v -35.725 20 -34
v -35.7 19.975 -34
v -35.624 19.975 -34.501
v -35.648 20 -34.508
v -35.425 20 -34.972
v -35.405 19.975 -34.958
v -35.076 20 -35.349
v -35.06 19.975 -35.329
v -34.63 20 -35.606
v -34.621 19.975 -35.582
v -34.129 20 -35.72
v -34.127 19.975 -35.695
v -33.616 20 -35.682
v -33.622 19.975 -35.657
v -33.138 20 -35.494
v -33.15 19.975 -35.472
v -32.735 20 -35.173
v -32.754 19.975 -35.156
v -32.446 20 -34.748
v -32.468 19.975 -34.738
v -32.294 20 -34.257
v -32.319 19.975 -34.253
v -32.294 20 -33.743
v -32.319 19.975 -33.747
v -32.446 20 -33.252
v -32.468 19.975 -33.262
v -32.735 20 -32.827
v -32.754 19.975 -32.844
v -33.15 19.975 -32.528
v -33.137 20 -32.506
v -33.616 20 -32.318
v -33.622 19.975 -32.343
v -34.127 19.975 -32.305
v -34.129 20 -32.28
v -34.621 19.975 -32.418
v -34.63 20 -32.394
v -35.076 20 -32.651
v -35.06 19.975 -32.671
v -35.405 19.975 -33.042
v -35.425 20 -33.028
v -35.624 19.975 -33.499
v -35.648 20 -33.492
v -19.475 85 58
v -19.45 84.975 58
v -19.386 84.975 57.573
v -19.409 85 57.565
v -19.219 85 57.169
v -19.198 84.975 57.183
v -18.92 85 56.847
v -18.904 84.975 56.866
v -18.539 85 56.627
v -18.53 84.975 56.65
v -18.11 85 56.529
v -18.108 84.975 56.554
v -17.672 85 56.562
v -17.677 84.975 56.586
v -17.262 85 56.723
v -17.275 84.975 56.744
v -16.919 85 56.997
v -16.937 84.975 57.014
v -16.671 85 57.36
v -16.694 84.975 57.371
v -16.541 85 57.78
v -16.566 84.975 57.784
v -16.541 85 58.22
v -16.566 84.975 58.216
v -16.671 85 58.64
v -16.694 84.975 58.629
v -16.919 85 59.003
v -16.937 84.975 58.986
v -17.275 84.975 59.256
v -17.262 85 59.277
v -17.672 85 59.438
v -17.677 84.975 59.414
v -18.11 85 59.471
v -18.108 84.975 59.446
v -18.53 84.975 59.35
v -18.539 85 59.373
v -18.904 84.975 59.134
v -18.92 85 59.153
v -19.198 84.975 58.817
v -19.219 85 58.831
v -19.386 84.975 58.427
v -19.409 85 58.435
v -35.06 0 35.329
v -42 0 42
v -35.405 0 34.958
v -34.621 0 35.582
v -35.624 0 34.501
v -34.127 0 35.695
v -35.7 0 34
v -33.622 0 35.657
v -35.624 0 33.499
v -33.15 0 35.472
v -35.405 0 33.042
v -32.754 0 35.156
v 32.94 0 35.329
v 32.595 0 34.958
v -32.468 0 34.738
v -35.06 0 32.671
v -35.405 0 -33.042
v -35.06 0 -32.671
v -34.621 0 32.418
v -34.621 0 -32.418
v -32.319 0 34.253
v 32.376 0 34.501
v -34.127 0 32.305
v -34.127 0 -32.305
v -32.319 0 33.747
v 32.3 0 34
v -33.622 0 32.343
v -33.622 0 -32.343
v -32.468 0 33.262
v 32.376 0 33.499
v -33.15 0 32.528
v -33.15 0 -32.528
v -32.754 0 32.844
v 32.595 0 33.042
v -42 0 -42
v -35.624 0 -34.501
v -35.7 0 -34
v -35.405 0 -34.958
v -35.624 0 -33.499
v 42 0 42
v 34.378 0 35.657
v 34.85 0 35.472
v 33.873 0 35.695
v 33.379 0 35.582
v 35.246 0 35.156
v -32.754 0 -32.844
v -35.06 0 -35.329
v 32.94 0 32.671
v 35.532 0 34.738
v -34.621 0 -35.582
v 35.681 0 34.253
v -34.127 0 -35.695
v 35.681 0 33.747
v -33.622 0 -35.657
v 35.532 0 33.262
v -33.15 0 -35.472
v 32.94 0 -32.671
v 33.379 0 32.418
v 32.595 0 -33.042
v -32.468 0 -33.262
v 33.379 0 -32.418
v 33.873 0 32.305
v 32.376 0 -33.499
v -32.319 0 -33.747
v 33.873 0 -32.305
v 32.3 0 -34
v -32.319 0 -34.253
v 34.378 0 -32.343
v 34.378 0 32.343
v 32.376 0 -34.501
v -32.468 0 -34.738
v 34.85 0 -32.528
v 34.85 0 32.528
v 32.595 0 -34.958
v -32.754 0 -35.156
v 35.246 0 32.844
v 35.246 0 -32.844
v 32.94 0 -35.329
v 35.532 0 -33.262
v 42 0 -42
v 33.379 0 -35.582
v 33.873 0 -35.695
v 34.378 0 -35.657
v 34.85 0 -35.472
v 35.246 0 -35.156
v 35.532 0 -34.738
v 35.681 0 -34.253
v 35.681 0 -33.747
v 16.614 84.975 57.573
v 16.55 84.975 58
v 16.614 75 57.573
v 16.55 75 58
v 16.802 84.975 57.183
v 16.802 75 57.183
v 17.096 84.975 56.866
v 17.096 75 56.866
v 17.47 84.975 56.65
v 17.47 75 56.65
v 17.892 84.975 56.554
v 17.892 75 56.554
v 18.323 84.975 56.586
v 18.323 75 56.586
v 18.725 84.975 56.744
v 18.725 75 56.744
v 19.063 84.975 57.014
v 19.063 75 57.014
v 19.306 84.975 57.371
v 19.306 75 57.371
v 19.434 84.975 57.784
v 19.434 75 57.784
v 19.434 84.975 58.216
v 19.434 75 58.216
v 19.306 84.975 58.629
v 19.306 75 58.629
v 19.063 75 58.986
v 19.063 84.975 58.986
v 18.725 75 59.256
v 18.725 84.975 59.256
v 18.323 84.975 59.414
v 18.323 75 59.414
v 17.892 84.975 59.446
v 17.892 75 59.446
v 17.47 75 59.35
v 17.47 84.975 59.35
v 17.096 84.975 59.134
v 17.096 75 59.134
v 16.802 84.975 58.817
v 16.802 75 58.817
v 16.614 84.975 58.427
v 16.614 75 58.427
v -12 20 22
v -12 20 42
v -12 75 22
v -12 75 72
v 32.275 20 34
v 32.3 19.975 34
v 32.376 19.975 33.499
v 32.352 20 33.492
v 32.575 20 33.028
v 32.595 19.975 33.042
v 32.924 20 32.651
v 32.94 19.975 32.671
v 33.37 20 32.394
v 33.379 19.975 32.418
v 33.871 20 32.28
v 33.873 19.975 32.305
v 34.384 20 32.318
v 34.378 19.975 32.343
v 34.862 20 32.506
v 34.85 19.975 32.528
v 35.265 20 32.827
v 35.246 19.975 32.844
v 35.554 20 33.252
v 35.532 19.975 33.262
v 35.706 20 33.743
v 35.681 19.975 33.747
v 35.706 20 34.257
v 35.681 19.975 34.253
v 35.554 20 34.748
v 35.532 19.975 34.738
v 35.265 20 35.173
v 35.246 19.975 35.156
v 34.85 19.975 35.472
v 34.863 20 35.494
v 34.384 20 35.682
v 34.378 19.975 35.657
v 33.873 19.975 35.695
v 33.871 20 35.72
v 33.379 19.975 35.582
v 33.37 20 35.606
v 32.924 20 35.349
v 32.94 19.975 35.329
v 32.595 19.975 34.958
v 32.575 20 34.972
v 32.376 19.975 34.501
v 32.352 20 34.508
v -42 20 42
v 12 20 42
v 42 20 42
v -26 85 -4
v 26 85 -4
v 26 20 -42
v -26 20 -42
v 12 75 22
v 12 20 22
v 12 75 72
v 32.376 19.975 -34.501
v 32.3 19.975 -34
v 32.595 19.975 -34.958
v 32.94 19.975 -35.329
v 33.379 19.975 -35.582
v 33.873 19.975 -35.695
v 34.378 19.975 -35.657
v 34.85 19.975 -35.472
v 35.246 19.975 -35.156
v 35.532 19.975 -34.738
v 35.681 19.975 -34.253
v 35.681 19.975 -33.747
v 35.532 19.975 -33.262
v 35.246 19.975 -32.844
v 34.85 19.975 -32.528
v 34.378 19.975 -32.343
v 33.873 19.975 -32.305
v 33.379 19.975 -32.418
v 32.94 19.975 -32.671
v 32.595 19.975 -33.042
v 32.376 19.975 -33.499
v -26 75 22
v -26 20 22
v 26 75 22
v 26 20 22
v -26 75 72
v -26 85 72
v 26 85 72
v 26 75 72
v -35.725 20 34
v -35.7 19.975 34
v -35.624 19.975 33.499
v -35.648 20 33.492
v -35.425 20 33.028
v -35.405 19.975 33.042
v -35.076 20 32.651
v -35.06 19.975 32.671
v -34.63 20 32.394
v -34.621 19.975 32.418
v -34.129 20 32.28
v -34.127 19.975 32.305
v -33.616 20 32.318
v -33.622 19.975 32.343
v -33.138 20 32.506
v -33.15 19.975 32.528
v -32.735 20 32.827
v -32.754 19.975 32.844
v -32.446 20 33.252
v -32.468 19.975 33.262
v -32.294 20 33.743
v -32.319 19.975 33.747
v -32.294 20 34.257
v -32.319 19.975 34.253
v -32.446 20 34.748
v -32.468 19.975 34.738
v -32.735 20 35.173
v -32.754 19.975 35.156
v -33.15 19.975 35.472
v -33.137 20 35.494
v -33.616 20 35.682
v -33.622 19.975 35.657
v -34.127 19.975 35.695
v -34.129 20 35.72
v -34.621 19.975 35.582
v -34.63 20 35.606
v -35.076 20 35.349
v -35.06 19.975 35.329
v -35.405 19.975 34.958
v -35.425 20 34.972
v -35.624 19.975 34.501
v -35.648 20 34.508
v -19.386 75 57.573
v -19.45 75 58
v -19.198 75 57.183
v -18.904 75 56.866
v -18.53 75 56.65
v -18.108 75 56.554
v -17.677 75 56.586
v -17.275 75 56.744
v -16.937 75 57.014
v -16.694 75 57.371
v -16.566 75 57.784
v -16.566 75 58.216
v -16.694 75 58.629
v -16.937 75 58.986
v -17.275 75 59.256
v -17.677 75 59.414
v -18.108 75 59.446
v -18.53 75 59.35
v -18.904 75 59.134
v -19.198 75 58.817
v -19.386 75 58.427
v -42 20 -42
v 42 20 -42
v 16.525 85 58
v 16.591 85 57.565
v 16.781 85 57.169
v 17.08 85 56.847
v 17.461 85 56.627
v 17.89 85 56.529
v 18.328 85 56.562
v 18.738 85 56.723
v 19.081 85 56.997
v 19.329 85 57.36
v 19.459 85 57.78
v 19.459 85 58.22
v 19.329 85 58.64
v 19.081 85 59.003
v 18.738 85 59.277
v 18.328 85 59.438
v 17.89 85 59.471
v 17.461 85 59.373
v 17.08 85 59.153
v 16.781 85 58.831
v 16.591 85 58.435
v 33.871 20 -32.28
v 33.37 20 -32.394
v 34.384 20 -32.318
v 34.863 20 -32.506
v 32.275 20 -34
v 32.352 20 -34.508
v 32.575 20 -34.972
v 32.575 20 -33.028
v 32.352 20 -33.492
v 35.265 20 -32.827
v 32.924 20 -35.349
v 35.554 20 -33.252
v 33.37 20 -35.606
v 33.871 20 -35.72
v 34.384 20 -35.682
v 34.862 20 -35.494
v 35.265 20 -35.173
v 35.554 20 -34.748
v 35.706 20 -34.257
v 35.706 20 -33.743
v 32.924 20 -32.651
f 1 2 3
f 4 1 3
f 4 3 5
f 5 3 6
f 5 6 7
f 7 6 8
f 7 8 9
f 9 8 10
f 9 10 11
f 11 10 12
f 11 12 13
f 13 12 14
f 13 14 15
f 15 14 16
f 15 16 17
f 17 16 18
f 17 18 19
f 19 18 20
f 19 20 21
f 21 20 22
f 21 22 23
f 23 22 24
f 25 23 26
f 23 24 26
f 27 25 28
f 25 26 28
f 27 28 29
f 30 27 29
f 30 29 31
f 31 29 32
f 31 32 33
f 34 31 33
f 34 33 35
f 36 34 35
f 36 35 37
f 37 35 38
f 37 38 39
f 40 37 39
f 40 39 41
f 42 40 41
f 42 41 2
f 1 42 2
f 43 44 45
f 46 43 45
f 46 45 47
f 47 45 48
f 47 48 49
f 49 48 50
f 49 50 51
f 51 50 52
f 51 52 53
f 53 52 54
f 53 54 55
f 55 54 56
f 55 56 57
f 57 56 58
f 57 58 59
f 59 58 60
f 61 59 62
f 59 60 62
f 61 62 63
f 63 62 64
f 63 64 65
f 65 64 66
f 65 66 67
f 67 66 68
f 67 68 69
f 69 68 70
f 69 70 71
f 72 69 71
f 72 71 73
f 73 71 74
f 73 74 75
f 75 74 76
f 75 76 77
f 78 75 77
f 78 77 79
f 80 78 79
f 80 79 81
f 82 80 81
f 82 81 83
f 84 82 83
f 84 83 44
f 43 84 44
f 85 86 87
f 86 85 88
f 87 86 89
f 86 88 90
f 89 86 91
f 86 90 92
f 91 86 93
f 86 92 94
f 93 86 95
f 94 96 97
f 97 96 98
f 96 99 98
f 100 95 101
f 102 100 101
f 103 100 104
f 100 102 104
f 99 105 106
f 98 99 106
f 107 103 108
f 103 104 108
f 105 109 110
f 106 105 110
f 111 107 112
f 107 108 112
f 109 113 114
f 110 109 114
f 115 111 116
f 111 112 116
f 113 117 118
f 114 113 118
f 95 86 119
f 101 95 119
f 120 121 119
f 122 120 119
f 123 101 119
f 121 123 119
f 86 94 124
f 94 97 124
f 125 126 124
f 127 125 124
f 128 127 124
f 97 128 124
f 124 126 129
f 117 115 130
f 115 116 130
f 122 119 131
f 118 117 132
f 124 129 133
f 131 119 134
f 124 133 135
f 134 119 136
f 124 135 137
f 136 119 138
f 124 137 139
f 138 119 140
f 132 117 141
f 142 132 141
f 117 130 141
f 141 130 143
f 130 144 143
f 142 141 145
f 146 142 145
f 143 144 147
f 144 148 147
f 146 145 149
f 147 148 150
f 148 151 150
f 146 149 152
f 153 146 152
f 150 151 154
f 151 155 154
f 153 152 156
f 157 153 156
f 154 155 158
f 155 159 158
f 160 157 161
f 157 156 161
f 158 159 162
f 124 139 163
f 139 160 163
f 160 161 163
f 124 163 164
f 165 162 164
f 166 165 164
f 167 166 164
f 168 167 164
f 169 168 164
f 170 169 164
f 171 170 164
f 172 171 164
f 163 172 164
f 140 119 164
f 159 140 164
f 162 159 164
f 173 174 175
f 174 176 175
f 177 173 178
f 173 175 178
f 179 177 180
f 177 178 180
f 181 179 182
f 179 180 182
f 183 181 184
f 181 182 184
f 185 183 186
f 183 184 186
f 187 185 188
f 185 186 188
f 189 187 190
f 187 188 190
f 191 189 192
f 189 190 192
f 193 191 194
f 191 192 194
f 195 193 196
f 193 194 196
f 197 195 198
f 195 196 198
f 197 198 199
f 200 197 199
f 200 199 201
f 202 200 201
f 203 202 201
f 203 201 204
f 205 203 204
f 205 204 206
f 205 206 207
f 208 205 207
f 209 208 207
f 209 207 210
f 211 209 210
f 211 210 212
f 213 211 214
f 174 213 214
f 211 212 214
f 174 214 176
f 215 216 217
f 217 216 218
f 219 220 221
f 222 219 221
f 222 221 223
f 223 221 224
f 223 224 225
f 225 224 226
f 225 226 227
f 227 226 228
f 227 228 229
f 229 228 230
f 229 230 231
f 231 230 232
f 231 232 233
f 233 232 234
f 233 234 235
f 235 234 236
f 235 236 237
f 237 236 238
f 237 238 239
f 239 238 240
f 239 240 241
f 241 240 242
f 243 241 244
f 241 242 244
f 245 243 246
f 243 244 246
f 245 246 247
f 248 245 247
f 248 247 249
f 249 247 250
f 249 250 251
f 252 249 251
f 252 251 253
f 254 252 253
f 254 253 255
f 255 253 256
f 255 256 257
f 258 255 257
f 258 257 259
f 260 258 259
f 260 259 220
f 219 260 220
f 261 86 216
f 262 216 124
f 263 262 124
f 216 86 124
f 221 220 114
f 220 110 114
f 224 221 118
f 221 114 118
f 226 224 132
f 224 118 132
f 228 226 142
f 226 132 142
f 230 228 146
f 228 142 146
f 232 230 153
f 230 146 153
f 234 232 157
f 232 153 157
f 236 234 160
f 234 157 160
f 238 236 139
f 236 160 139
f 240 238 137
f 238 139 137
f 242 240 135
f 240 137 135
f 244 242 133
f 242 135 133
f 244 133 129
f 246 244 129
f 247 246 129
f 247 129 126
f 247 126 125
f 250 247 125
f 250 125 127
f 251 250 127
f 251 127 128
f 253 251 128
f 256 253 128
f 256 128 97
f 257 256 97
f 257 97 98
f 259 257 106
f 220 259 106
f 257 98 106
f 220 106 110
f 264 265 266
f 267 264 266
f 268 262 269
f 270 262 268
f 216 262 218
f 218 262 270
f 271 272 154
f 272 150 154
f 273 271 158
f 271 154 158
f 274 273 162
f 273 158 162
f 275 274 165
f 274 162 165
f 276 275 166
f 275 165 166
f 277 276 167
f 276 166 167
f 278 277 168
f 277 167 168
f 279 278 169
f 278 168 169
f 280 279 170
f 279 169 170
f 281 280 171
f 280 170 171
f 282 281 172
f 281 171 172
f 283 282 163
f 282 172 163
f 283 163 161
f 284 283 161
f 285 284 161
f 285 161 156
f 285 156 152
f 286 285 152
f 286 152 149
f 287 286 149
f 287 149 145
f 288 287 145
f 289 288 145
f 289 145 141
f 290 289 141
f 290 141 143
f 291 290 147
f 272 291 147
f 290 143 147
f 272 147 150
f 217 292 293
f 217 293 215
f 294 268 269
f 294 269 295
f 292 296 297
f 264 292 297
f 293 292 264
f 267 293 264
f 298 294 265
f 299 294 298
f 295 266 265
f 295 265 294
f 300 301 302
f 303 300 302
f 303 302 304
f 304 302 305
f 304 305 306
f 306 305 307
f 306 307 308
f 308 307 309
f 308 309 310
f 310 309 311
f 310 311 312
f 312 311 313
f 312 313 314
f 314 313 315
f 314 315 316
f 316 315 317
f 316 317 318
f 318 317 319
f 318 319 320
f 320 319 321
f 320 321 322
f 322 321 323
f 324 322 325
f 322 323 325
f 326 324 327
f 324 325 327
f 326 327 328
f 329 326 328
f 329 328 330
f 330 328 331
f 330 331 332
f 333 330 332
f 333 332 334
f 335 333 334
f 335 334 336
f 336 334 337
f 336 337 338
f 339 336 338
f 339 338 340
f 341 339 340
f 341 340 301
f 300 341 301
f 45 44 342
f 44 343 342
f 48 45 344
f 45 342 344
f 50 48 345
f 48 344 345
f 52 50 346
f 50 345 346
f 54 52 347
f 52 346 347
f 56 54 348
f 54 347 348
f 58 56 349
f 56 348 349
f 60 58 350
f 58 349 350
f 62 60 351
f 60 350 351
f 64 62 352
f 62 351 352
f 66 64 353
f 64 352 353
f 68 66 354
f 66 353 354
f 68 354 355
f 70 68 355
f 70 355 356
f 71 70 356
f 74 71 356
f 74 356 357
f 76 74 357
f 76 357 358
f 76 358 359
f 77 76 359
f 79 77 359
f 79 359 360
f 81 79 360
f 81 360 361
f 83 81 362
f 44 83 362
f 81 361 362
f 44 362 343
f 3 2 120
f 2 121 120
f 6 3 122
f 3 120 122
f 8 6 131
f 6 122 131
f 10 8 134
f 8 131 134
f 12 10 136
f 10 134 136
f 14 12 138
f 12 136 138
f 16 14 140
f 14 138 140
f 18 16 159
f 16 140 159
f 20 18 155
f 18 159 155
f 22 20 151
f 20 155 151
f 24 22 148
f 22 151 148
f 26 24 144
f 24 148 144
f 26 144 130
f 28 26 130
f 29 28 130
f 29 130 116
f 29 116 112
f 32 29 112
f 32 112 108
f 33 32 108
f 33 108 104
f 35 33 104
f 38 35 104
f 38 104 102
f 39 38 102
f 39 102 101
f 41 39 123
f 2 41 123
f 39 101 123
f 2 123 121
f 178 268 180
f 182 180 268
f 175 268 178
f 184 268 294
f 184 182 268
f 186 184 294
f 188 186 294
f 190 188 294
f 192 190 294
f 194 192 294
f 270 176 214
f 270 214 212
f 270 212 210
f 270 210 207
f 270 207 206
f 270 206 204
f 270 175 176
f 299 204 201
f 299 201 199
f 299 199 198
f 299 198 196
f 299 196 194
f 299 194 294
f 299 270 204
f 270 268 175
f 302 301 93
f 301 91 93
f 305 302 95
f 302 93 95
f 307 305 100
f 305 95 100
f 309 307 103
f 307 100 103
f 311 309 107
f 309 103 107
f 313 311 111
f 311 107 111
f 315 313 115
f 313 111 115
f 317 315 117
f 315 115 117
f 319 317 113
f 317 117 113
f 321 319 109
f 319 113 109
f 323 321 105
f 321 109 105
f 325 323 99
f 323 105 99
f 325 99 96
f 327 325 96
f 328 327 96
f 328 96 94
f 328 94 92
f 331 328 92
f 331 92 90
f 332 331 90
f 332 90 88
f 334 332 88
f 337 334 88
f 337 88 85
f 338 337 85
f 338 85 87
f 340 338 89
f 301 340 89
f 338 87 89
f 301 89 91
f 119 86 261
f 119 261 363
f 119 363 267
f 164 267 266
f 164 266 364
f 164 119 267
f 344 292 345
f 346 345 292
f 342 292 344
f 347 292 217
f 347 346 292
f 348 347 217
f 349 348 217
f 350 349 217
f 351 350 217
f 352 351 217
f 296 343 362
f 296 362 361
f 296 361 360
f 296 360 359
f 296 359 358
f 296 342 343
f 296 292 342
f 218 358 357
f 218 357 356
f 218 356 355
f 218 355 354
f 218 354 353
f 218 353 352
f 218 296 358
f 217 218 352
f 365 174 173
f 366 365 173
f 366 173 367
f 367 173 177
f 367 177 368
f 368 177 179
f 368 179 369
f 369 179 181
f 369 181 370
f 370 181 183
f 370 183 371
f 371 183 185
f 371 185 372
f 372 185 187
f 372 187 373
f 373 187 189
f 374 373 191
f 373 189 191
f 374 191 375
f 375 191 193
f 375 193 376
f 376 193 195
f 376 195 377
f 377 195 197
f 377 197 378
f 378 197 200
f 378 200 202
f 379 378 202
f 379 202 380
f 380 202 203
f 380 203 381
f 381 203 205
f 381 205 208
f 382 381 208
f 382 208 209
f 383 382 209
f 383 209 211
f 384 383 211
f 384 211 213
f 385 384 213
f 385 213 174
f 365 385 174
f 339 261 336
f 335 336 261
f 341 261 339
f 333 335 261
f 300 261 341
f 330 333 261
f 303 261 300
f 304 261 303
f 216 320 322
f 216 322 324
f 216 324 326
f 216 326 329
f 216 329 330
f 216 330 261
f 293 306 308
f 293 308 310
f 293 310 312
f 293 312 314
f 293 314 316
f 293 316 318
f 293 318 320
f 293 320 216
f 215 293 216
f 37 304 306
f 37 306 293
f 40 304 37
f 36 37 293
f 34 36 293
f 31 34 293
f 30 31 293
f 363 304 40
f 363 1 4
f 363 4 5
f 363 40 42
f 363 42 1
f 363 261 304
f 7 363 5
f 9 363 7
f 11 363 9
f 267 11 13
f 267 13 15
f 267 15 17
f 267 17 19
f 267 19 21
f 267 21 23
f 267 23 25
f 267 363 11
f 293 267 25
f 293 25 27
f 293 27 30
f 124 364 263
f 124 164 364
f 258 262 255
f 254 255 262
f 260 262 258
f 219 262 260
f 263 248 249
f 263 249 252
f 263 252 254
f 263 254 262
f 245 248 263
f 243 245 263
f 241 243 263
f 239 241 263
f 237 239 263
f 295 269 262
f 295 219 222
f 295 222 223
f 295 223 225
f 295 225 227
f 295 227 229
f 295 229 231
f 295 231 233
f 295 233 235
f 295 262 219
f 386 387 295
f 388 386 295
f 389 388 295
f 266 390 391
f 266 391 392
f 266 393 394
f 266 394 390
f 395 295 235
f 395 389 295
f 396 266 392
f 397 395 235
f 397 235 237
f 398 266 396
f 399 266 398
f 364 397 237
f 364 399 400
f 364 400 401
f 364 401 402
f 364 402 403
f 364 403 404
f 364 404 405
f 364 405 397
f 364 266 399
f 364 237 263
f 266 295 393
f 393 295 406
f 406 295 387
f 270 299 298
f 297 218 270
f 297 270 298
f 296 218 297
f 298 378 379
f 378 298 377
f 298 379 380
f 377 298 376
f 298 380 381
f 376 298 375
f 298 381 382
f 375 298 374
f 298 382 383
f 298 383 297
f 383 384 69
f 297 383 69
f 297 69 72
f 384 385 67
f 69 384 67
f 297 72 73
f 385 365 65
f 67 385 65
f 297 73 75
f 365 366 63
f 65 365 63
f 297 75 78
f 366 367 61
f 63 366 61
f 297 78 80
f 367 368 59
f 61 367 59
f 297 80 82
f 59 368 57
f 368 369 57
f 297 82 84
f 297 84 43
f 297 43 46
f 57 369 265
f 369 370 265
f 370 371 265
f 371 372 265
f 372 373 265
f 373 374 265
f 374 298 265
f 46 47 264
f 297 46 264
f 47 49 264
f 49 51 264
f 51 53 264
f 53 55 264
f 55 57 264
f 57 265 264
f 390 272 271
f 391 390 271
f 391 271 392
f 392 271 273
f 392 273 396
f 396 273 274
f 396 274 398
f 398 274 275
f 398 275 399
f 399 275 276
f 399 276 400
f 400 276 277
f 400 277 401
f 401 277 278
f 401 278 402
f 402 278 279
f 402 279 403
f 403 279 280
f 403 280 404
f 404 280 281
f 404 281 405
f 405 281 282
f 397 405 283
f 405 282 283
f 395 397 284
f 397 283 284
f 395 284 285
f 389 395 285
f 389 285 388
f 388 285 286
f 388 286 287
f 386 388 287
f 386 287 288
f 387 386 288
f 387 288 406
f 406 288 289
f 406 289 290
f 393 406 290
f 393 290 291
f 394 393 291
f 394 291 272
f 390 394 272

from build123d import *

# Parameters (mm, degrees)
SKETCH1_W                        = 84
SKETCH1_H                        = 84
BOSS_EXTRUDE1_DEPTH              = 20
M3_CLEARANCE_HOLE1_D             = 3.4
M3_CLEARANCE_HOLE1_CSINK_D       = 3.45
M3_CLEARANCE_HOLE1_CSINK_ANGLE   = 90
BOSS_EXTRUDE2_DEPTH              = 65
BOSS_EXTRUDE3_DEPTH              = 10
M2_5_CLEARANCE_HOLE2_D           = 2.9
M2_5_CLEARANCE_HOLE2_DEPTH       = 10
M2_5_CLEARANCE_HOLE2_CSINK_D     = 2.95
M2_5_CLEARANCE_HOLE2_CSINK_ANGLE = 90
M2_5_CLEARANCE_HOLE2_TIP         = 0.871247898
SKETCH16_W                       = 30
SKETCH16_H                       = 55
CUT_EXTRUDE2_DEPTH               = 50
CUT_EXTRUDE3_DEPTH               = 124.794184031
CUT_EXTRUDE4_DEPTH               = 230
SKETCH19_W                       = 16
SKETCH19_H                       = 65
CUT_EXTRUDE5_DEPTH               = 230


with BuildPart() as part:
    # Sketch1 → Boss-Extrude1 (new body)
    with BuildSketch(Plane(origin=(0, 0, 0), x_dir=(1, 0, 0), z_dir=(0, 1, 0))):
        Rectangle(SKETCH1_W, SKETCH1_H)
    extrude(amount=BOSS_EXTRUDE1_DEPTH)

    # M3 Clearance Hole1 (through all)
    with Locations(Plane(origin=(0, 20, 0), x_dir=(1, 0, 0), z_dir=(0, 1, 0))):
        with Locations((-34, 34), (34, 34), (34, -34), (-34, -34)):
            CounterSinkHole(M3_CLEARANCE_HOLE1_D / 2, M3_CLEARANCE_HOLE1_CSINK_D / 2, counter_sink_angle=M3_CLEARANCE_HOLE1_CSINK_ANGLE)

    # Sketch5 → Boss-Extrude2 (add)
    with BuildSketch(Plane(origin=(0, 20, 0), x_dir=(1, 0, 0), z_dir=(0, 1, 0))):
        Polygon((-42, 4), (-26, 4), (-26, 42), (26, 42), (26, 4), (42, 4), (42, -72), (-42, -72), align=None)
    extrude(amount=BOSS_EXTRUDE2_DEPTH)

    # Sketch7 → Boss-Extrude3 (add)
    with BuildSketch(Plane(origin=(0, 85, 0), x_dir=(1, 0, 0), z_dir=(0, 1, 0))):
        Polygon((-42, 3), (-42, -42), (42, -42), (42, 3), (37.817930688, 3), (0, 3), (-37.817930688, 3), align=None)
    extrude(amount=-BOSS_EXTRUDE3_DEPTH)

    # M2.5 Clearance Hole2
    with Locations(Plane(origin=(0, 85, 0), x_dir=(1, 0, 0), z_dir=(0, 1, 0))):
        with Locations((-18, -58), (18, -58)):
            CounterSinkHole(M2_5_CLEARANCE_HOLE2_D / 2, M2_5_CLEARANCE_HOLE2_CSINK_D / 2, depth=M2_5_CLEARANCE_HOLE2_DEPTH, counter_sink_angle=M2_5_CLEARANCE_HOLE2_CSINK_ANGLE)
            with Locations((0, 0, -(M2_5_CLEARANCE_HOLE2_DEPTH + M2_5_CLEARANCE_HOLE2_TIP / 2))):  # 118° drill point
                Cone(0, M2_5_CLEARANCE_HOLE2_D / 2, M2_5_CLEARANCE_HOLE2_TIP, mode=Mode.SUBTRACT)

    # Sketch16 → Cut-Extrude2 (cut)
    with BuildSketch(Plane.XY.offset(72)):
        with Locations((27, 47.5)):
            Rectangle(SKETCH16_W, SKETCH16_H)
        with Locations((-27, 47.5)):
            Rectangle(SKETCH16_W, SKETCH16_H)
    extrude(amount=-CUT_EXTRUDE2_DEPTH, mode=Mode.SUBTRACT)

    # Sketch17 → Cut-Extrude3 (cut, through all)
    with BuildSketch(Plane(origin=(12, 0, 0), x_dir=(0, 0, -1), z_dir=(1, 0, 0))):
        Polygon((-42, 20), (-72, 75), (-72, 20), align=None)
    extrude(amount=-CUT_EXTRUDE3_DEPTH, mode=Mode.SUBTRACT)

    # Sketch18 → Cut-Extrude4 (cut)
    with BuildSketch(Plane(origin=(26, 0, 0), x_dir=(0, 0, -1), z_dir=(1, 0, 0))):
        Polygon((4, 85), (42, 20), (42, 85), align=None)
    extrude(amount=-CUT_EXTRUDE4_DEPTH, mode=Mode.SUBTRACT)

    # Sketch19 → Cut-Extrude5 (cut)
    with BuildSketch(Plane(origin=(0, 0, -4), x_dir=(-1, 0, 0), z_dir=(0, 0, -1))):
        with Locations((-34, 52.5)):
            Rectangle(SKETCH19_W, SKETCH19_H)
        with Locations((34, 52.5)):
            Rectangle(SKETCH19_W, SKETCH19_H)
    extrude(amount=-CUT_EXTRUDE5_DEPTH, mode=Mode.SUBTRACT)


solid = part.part
